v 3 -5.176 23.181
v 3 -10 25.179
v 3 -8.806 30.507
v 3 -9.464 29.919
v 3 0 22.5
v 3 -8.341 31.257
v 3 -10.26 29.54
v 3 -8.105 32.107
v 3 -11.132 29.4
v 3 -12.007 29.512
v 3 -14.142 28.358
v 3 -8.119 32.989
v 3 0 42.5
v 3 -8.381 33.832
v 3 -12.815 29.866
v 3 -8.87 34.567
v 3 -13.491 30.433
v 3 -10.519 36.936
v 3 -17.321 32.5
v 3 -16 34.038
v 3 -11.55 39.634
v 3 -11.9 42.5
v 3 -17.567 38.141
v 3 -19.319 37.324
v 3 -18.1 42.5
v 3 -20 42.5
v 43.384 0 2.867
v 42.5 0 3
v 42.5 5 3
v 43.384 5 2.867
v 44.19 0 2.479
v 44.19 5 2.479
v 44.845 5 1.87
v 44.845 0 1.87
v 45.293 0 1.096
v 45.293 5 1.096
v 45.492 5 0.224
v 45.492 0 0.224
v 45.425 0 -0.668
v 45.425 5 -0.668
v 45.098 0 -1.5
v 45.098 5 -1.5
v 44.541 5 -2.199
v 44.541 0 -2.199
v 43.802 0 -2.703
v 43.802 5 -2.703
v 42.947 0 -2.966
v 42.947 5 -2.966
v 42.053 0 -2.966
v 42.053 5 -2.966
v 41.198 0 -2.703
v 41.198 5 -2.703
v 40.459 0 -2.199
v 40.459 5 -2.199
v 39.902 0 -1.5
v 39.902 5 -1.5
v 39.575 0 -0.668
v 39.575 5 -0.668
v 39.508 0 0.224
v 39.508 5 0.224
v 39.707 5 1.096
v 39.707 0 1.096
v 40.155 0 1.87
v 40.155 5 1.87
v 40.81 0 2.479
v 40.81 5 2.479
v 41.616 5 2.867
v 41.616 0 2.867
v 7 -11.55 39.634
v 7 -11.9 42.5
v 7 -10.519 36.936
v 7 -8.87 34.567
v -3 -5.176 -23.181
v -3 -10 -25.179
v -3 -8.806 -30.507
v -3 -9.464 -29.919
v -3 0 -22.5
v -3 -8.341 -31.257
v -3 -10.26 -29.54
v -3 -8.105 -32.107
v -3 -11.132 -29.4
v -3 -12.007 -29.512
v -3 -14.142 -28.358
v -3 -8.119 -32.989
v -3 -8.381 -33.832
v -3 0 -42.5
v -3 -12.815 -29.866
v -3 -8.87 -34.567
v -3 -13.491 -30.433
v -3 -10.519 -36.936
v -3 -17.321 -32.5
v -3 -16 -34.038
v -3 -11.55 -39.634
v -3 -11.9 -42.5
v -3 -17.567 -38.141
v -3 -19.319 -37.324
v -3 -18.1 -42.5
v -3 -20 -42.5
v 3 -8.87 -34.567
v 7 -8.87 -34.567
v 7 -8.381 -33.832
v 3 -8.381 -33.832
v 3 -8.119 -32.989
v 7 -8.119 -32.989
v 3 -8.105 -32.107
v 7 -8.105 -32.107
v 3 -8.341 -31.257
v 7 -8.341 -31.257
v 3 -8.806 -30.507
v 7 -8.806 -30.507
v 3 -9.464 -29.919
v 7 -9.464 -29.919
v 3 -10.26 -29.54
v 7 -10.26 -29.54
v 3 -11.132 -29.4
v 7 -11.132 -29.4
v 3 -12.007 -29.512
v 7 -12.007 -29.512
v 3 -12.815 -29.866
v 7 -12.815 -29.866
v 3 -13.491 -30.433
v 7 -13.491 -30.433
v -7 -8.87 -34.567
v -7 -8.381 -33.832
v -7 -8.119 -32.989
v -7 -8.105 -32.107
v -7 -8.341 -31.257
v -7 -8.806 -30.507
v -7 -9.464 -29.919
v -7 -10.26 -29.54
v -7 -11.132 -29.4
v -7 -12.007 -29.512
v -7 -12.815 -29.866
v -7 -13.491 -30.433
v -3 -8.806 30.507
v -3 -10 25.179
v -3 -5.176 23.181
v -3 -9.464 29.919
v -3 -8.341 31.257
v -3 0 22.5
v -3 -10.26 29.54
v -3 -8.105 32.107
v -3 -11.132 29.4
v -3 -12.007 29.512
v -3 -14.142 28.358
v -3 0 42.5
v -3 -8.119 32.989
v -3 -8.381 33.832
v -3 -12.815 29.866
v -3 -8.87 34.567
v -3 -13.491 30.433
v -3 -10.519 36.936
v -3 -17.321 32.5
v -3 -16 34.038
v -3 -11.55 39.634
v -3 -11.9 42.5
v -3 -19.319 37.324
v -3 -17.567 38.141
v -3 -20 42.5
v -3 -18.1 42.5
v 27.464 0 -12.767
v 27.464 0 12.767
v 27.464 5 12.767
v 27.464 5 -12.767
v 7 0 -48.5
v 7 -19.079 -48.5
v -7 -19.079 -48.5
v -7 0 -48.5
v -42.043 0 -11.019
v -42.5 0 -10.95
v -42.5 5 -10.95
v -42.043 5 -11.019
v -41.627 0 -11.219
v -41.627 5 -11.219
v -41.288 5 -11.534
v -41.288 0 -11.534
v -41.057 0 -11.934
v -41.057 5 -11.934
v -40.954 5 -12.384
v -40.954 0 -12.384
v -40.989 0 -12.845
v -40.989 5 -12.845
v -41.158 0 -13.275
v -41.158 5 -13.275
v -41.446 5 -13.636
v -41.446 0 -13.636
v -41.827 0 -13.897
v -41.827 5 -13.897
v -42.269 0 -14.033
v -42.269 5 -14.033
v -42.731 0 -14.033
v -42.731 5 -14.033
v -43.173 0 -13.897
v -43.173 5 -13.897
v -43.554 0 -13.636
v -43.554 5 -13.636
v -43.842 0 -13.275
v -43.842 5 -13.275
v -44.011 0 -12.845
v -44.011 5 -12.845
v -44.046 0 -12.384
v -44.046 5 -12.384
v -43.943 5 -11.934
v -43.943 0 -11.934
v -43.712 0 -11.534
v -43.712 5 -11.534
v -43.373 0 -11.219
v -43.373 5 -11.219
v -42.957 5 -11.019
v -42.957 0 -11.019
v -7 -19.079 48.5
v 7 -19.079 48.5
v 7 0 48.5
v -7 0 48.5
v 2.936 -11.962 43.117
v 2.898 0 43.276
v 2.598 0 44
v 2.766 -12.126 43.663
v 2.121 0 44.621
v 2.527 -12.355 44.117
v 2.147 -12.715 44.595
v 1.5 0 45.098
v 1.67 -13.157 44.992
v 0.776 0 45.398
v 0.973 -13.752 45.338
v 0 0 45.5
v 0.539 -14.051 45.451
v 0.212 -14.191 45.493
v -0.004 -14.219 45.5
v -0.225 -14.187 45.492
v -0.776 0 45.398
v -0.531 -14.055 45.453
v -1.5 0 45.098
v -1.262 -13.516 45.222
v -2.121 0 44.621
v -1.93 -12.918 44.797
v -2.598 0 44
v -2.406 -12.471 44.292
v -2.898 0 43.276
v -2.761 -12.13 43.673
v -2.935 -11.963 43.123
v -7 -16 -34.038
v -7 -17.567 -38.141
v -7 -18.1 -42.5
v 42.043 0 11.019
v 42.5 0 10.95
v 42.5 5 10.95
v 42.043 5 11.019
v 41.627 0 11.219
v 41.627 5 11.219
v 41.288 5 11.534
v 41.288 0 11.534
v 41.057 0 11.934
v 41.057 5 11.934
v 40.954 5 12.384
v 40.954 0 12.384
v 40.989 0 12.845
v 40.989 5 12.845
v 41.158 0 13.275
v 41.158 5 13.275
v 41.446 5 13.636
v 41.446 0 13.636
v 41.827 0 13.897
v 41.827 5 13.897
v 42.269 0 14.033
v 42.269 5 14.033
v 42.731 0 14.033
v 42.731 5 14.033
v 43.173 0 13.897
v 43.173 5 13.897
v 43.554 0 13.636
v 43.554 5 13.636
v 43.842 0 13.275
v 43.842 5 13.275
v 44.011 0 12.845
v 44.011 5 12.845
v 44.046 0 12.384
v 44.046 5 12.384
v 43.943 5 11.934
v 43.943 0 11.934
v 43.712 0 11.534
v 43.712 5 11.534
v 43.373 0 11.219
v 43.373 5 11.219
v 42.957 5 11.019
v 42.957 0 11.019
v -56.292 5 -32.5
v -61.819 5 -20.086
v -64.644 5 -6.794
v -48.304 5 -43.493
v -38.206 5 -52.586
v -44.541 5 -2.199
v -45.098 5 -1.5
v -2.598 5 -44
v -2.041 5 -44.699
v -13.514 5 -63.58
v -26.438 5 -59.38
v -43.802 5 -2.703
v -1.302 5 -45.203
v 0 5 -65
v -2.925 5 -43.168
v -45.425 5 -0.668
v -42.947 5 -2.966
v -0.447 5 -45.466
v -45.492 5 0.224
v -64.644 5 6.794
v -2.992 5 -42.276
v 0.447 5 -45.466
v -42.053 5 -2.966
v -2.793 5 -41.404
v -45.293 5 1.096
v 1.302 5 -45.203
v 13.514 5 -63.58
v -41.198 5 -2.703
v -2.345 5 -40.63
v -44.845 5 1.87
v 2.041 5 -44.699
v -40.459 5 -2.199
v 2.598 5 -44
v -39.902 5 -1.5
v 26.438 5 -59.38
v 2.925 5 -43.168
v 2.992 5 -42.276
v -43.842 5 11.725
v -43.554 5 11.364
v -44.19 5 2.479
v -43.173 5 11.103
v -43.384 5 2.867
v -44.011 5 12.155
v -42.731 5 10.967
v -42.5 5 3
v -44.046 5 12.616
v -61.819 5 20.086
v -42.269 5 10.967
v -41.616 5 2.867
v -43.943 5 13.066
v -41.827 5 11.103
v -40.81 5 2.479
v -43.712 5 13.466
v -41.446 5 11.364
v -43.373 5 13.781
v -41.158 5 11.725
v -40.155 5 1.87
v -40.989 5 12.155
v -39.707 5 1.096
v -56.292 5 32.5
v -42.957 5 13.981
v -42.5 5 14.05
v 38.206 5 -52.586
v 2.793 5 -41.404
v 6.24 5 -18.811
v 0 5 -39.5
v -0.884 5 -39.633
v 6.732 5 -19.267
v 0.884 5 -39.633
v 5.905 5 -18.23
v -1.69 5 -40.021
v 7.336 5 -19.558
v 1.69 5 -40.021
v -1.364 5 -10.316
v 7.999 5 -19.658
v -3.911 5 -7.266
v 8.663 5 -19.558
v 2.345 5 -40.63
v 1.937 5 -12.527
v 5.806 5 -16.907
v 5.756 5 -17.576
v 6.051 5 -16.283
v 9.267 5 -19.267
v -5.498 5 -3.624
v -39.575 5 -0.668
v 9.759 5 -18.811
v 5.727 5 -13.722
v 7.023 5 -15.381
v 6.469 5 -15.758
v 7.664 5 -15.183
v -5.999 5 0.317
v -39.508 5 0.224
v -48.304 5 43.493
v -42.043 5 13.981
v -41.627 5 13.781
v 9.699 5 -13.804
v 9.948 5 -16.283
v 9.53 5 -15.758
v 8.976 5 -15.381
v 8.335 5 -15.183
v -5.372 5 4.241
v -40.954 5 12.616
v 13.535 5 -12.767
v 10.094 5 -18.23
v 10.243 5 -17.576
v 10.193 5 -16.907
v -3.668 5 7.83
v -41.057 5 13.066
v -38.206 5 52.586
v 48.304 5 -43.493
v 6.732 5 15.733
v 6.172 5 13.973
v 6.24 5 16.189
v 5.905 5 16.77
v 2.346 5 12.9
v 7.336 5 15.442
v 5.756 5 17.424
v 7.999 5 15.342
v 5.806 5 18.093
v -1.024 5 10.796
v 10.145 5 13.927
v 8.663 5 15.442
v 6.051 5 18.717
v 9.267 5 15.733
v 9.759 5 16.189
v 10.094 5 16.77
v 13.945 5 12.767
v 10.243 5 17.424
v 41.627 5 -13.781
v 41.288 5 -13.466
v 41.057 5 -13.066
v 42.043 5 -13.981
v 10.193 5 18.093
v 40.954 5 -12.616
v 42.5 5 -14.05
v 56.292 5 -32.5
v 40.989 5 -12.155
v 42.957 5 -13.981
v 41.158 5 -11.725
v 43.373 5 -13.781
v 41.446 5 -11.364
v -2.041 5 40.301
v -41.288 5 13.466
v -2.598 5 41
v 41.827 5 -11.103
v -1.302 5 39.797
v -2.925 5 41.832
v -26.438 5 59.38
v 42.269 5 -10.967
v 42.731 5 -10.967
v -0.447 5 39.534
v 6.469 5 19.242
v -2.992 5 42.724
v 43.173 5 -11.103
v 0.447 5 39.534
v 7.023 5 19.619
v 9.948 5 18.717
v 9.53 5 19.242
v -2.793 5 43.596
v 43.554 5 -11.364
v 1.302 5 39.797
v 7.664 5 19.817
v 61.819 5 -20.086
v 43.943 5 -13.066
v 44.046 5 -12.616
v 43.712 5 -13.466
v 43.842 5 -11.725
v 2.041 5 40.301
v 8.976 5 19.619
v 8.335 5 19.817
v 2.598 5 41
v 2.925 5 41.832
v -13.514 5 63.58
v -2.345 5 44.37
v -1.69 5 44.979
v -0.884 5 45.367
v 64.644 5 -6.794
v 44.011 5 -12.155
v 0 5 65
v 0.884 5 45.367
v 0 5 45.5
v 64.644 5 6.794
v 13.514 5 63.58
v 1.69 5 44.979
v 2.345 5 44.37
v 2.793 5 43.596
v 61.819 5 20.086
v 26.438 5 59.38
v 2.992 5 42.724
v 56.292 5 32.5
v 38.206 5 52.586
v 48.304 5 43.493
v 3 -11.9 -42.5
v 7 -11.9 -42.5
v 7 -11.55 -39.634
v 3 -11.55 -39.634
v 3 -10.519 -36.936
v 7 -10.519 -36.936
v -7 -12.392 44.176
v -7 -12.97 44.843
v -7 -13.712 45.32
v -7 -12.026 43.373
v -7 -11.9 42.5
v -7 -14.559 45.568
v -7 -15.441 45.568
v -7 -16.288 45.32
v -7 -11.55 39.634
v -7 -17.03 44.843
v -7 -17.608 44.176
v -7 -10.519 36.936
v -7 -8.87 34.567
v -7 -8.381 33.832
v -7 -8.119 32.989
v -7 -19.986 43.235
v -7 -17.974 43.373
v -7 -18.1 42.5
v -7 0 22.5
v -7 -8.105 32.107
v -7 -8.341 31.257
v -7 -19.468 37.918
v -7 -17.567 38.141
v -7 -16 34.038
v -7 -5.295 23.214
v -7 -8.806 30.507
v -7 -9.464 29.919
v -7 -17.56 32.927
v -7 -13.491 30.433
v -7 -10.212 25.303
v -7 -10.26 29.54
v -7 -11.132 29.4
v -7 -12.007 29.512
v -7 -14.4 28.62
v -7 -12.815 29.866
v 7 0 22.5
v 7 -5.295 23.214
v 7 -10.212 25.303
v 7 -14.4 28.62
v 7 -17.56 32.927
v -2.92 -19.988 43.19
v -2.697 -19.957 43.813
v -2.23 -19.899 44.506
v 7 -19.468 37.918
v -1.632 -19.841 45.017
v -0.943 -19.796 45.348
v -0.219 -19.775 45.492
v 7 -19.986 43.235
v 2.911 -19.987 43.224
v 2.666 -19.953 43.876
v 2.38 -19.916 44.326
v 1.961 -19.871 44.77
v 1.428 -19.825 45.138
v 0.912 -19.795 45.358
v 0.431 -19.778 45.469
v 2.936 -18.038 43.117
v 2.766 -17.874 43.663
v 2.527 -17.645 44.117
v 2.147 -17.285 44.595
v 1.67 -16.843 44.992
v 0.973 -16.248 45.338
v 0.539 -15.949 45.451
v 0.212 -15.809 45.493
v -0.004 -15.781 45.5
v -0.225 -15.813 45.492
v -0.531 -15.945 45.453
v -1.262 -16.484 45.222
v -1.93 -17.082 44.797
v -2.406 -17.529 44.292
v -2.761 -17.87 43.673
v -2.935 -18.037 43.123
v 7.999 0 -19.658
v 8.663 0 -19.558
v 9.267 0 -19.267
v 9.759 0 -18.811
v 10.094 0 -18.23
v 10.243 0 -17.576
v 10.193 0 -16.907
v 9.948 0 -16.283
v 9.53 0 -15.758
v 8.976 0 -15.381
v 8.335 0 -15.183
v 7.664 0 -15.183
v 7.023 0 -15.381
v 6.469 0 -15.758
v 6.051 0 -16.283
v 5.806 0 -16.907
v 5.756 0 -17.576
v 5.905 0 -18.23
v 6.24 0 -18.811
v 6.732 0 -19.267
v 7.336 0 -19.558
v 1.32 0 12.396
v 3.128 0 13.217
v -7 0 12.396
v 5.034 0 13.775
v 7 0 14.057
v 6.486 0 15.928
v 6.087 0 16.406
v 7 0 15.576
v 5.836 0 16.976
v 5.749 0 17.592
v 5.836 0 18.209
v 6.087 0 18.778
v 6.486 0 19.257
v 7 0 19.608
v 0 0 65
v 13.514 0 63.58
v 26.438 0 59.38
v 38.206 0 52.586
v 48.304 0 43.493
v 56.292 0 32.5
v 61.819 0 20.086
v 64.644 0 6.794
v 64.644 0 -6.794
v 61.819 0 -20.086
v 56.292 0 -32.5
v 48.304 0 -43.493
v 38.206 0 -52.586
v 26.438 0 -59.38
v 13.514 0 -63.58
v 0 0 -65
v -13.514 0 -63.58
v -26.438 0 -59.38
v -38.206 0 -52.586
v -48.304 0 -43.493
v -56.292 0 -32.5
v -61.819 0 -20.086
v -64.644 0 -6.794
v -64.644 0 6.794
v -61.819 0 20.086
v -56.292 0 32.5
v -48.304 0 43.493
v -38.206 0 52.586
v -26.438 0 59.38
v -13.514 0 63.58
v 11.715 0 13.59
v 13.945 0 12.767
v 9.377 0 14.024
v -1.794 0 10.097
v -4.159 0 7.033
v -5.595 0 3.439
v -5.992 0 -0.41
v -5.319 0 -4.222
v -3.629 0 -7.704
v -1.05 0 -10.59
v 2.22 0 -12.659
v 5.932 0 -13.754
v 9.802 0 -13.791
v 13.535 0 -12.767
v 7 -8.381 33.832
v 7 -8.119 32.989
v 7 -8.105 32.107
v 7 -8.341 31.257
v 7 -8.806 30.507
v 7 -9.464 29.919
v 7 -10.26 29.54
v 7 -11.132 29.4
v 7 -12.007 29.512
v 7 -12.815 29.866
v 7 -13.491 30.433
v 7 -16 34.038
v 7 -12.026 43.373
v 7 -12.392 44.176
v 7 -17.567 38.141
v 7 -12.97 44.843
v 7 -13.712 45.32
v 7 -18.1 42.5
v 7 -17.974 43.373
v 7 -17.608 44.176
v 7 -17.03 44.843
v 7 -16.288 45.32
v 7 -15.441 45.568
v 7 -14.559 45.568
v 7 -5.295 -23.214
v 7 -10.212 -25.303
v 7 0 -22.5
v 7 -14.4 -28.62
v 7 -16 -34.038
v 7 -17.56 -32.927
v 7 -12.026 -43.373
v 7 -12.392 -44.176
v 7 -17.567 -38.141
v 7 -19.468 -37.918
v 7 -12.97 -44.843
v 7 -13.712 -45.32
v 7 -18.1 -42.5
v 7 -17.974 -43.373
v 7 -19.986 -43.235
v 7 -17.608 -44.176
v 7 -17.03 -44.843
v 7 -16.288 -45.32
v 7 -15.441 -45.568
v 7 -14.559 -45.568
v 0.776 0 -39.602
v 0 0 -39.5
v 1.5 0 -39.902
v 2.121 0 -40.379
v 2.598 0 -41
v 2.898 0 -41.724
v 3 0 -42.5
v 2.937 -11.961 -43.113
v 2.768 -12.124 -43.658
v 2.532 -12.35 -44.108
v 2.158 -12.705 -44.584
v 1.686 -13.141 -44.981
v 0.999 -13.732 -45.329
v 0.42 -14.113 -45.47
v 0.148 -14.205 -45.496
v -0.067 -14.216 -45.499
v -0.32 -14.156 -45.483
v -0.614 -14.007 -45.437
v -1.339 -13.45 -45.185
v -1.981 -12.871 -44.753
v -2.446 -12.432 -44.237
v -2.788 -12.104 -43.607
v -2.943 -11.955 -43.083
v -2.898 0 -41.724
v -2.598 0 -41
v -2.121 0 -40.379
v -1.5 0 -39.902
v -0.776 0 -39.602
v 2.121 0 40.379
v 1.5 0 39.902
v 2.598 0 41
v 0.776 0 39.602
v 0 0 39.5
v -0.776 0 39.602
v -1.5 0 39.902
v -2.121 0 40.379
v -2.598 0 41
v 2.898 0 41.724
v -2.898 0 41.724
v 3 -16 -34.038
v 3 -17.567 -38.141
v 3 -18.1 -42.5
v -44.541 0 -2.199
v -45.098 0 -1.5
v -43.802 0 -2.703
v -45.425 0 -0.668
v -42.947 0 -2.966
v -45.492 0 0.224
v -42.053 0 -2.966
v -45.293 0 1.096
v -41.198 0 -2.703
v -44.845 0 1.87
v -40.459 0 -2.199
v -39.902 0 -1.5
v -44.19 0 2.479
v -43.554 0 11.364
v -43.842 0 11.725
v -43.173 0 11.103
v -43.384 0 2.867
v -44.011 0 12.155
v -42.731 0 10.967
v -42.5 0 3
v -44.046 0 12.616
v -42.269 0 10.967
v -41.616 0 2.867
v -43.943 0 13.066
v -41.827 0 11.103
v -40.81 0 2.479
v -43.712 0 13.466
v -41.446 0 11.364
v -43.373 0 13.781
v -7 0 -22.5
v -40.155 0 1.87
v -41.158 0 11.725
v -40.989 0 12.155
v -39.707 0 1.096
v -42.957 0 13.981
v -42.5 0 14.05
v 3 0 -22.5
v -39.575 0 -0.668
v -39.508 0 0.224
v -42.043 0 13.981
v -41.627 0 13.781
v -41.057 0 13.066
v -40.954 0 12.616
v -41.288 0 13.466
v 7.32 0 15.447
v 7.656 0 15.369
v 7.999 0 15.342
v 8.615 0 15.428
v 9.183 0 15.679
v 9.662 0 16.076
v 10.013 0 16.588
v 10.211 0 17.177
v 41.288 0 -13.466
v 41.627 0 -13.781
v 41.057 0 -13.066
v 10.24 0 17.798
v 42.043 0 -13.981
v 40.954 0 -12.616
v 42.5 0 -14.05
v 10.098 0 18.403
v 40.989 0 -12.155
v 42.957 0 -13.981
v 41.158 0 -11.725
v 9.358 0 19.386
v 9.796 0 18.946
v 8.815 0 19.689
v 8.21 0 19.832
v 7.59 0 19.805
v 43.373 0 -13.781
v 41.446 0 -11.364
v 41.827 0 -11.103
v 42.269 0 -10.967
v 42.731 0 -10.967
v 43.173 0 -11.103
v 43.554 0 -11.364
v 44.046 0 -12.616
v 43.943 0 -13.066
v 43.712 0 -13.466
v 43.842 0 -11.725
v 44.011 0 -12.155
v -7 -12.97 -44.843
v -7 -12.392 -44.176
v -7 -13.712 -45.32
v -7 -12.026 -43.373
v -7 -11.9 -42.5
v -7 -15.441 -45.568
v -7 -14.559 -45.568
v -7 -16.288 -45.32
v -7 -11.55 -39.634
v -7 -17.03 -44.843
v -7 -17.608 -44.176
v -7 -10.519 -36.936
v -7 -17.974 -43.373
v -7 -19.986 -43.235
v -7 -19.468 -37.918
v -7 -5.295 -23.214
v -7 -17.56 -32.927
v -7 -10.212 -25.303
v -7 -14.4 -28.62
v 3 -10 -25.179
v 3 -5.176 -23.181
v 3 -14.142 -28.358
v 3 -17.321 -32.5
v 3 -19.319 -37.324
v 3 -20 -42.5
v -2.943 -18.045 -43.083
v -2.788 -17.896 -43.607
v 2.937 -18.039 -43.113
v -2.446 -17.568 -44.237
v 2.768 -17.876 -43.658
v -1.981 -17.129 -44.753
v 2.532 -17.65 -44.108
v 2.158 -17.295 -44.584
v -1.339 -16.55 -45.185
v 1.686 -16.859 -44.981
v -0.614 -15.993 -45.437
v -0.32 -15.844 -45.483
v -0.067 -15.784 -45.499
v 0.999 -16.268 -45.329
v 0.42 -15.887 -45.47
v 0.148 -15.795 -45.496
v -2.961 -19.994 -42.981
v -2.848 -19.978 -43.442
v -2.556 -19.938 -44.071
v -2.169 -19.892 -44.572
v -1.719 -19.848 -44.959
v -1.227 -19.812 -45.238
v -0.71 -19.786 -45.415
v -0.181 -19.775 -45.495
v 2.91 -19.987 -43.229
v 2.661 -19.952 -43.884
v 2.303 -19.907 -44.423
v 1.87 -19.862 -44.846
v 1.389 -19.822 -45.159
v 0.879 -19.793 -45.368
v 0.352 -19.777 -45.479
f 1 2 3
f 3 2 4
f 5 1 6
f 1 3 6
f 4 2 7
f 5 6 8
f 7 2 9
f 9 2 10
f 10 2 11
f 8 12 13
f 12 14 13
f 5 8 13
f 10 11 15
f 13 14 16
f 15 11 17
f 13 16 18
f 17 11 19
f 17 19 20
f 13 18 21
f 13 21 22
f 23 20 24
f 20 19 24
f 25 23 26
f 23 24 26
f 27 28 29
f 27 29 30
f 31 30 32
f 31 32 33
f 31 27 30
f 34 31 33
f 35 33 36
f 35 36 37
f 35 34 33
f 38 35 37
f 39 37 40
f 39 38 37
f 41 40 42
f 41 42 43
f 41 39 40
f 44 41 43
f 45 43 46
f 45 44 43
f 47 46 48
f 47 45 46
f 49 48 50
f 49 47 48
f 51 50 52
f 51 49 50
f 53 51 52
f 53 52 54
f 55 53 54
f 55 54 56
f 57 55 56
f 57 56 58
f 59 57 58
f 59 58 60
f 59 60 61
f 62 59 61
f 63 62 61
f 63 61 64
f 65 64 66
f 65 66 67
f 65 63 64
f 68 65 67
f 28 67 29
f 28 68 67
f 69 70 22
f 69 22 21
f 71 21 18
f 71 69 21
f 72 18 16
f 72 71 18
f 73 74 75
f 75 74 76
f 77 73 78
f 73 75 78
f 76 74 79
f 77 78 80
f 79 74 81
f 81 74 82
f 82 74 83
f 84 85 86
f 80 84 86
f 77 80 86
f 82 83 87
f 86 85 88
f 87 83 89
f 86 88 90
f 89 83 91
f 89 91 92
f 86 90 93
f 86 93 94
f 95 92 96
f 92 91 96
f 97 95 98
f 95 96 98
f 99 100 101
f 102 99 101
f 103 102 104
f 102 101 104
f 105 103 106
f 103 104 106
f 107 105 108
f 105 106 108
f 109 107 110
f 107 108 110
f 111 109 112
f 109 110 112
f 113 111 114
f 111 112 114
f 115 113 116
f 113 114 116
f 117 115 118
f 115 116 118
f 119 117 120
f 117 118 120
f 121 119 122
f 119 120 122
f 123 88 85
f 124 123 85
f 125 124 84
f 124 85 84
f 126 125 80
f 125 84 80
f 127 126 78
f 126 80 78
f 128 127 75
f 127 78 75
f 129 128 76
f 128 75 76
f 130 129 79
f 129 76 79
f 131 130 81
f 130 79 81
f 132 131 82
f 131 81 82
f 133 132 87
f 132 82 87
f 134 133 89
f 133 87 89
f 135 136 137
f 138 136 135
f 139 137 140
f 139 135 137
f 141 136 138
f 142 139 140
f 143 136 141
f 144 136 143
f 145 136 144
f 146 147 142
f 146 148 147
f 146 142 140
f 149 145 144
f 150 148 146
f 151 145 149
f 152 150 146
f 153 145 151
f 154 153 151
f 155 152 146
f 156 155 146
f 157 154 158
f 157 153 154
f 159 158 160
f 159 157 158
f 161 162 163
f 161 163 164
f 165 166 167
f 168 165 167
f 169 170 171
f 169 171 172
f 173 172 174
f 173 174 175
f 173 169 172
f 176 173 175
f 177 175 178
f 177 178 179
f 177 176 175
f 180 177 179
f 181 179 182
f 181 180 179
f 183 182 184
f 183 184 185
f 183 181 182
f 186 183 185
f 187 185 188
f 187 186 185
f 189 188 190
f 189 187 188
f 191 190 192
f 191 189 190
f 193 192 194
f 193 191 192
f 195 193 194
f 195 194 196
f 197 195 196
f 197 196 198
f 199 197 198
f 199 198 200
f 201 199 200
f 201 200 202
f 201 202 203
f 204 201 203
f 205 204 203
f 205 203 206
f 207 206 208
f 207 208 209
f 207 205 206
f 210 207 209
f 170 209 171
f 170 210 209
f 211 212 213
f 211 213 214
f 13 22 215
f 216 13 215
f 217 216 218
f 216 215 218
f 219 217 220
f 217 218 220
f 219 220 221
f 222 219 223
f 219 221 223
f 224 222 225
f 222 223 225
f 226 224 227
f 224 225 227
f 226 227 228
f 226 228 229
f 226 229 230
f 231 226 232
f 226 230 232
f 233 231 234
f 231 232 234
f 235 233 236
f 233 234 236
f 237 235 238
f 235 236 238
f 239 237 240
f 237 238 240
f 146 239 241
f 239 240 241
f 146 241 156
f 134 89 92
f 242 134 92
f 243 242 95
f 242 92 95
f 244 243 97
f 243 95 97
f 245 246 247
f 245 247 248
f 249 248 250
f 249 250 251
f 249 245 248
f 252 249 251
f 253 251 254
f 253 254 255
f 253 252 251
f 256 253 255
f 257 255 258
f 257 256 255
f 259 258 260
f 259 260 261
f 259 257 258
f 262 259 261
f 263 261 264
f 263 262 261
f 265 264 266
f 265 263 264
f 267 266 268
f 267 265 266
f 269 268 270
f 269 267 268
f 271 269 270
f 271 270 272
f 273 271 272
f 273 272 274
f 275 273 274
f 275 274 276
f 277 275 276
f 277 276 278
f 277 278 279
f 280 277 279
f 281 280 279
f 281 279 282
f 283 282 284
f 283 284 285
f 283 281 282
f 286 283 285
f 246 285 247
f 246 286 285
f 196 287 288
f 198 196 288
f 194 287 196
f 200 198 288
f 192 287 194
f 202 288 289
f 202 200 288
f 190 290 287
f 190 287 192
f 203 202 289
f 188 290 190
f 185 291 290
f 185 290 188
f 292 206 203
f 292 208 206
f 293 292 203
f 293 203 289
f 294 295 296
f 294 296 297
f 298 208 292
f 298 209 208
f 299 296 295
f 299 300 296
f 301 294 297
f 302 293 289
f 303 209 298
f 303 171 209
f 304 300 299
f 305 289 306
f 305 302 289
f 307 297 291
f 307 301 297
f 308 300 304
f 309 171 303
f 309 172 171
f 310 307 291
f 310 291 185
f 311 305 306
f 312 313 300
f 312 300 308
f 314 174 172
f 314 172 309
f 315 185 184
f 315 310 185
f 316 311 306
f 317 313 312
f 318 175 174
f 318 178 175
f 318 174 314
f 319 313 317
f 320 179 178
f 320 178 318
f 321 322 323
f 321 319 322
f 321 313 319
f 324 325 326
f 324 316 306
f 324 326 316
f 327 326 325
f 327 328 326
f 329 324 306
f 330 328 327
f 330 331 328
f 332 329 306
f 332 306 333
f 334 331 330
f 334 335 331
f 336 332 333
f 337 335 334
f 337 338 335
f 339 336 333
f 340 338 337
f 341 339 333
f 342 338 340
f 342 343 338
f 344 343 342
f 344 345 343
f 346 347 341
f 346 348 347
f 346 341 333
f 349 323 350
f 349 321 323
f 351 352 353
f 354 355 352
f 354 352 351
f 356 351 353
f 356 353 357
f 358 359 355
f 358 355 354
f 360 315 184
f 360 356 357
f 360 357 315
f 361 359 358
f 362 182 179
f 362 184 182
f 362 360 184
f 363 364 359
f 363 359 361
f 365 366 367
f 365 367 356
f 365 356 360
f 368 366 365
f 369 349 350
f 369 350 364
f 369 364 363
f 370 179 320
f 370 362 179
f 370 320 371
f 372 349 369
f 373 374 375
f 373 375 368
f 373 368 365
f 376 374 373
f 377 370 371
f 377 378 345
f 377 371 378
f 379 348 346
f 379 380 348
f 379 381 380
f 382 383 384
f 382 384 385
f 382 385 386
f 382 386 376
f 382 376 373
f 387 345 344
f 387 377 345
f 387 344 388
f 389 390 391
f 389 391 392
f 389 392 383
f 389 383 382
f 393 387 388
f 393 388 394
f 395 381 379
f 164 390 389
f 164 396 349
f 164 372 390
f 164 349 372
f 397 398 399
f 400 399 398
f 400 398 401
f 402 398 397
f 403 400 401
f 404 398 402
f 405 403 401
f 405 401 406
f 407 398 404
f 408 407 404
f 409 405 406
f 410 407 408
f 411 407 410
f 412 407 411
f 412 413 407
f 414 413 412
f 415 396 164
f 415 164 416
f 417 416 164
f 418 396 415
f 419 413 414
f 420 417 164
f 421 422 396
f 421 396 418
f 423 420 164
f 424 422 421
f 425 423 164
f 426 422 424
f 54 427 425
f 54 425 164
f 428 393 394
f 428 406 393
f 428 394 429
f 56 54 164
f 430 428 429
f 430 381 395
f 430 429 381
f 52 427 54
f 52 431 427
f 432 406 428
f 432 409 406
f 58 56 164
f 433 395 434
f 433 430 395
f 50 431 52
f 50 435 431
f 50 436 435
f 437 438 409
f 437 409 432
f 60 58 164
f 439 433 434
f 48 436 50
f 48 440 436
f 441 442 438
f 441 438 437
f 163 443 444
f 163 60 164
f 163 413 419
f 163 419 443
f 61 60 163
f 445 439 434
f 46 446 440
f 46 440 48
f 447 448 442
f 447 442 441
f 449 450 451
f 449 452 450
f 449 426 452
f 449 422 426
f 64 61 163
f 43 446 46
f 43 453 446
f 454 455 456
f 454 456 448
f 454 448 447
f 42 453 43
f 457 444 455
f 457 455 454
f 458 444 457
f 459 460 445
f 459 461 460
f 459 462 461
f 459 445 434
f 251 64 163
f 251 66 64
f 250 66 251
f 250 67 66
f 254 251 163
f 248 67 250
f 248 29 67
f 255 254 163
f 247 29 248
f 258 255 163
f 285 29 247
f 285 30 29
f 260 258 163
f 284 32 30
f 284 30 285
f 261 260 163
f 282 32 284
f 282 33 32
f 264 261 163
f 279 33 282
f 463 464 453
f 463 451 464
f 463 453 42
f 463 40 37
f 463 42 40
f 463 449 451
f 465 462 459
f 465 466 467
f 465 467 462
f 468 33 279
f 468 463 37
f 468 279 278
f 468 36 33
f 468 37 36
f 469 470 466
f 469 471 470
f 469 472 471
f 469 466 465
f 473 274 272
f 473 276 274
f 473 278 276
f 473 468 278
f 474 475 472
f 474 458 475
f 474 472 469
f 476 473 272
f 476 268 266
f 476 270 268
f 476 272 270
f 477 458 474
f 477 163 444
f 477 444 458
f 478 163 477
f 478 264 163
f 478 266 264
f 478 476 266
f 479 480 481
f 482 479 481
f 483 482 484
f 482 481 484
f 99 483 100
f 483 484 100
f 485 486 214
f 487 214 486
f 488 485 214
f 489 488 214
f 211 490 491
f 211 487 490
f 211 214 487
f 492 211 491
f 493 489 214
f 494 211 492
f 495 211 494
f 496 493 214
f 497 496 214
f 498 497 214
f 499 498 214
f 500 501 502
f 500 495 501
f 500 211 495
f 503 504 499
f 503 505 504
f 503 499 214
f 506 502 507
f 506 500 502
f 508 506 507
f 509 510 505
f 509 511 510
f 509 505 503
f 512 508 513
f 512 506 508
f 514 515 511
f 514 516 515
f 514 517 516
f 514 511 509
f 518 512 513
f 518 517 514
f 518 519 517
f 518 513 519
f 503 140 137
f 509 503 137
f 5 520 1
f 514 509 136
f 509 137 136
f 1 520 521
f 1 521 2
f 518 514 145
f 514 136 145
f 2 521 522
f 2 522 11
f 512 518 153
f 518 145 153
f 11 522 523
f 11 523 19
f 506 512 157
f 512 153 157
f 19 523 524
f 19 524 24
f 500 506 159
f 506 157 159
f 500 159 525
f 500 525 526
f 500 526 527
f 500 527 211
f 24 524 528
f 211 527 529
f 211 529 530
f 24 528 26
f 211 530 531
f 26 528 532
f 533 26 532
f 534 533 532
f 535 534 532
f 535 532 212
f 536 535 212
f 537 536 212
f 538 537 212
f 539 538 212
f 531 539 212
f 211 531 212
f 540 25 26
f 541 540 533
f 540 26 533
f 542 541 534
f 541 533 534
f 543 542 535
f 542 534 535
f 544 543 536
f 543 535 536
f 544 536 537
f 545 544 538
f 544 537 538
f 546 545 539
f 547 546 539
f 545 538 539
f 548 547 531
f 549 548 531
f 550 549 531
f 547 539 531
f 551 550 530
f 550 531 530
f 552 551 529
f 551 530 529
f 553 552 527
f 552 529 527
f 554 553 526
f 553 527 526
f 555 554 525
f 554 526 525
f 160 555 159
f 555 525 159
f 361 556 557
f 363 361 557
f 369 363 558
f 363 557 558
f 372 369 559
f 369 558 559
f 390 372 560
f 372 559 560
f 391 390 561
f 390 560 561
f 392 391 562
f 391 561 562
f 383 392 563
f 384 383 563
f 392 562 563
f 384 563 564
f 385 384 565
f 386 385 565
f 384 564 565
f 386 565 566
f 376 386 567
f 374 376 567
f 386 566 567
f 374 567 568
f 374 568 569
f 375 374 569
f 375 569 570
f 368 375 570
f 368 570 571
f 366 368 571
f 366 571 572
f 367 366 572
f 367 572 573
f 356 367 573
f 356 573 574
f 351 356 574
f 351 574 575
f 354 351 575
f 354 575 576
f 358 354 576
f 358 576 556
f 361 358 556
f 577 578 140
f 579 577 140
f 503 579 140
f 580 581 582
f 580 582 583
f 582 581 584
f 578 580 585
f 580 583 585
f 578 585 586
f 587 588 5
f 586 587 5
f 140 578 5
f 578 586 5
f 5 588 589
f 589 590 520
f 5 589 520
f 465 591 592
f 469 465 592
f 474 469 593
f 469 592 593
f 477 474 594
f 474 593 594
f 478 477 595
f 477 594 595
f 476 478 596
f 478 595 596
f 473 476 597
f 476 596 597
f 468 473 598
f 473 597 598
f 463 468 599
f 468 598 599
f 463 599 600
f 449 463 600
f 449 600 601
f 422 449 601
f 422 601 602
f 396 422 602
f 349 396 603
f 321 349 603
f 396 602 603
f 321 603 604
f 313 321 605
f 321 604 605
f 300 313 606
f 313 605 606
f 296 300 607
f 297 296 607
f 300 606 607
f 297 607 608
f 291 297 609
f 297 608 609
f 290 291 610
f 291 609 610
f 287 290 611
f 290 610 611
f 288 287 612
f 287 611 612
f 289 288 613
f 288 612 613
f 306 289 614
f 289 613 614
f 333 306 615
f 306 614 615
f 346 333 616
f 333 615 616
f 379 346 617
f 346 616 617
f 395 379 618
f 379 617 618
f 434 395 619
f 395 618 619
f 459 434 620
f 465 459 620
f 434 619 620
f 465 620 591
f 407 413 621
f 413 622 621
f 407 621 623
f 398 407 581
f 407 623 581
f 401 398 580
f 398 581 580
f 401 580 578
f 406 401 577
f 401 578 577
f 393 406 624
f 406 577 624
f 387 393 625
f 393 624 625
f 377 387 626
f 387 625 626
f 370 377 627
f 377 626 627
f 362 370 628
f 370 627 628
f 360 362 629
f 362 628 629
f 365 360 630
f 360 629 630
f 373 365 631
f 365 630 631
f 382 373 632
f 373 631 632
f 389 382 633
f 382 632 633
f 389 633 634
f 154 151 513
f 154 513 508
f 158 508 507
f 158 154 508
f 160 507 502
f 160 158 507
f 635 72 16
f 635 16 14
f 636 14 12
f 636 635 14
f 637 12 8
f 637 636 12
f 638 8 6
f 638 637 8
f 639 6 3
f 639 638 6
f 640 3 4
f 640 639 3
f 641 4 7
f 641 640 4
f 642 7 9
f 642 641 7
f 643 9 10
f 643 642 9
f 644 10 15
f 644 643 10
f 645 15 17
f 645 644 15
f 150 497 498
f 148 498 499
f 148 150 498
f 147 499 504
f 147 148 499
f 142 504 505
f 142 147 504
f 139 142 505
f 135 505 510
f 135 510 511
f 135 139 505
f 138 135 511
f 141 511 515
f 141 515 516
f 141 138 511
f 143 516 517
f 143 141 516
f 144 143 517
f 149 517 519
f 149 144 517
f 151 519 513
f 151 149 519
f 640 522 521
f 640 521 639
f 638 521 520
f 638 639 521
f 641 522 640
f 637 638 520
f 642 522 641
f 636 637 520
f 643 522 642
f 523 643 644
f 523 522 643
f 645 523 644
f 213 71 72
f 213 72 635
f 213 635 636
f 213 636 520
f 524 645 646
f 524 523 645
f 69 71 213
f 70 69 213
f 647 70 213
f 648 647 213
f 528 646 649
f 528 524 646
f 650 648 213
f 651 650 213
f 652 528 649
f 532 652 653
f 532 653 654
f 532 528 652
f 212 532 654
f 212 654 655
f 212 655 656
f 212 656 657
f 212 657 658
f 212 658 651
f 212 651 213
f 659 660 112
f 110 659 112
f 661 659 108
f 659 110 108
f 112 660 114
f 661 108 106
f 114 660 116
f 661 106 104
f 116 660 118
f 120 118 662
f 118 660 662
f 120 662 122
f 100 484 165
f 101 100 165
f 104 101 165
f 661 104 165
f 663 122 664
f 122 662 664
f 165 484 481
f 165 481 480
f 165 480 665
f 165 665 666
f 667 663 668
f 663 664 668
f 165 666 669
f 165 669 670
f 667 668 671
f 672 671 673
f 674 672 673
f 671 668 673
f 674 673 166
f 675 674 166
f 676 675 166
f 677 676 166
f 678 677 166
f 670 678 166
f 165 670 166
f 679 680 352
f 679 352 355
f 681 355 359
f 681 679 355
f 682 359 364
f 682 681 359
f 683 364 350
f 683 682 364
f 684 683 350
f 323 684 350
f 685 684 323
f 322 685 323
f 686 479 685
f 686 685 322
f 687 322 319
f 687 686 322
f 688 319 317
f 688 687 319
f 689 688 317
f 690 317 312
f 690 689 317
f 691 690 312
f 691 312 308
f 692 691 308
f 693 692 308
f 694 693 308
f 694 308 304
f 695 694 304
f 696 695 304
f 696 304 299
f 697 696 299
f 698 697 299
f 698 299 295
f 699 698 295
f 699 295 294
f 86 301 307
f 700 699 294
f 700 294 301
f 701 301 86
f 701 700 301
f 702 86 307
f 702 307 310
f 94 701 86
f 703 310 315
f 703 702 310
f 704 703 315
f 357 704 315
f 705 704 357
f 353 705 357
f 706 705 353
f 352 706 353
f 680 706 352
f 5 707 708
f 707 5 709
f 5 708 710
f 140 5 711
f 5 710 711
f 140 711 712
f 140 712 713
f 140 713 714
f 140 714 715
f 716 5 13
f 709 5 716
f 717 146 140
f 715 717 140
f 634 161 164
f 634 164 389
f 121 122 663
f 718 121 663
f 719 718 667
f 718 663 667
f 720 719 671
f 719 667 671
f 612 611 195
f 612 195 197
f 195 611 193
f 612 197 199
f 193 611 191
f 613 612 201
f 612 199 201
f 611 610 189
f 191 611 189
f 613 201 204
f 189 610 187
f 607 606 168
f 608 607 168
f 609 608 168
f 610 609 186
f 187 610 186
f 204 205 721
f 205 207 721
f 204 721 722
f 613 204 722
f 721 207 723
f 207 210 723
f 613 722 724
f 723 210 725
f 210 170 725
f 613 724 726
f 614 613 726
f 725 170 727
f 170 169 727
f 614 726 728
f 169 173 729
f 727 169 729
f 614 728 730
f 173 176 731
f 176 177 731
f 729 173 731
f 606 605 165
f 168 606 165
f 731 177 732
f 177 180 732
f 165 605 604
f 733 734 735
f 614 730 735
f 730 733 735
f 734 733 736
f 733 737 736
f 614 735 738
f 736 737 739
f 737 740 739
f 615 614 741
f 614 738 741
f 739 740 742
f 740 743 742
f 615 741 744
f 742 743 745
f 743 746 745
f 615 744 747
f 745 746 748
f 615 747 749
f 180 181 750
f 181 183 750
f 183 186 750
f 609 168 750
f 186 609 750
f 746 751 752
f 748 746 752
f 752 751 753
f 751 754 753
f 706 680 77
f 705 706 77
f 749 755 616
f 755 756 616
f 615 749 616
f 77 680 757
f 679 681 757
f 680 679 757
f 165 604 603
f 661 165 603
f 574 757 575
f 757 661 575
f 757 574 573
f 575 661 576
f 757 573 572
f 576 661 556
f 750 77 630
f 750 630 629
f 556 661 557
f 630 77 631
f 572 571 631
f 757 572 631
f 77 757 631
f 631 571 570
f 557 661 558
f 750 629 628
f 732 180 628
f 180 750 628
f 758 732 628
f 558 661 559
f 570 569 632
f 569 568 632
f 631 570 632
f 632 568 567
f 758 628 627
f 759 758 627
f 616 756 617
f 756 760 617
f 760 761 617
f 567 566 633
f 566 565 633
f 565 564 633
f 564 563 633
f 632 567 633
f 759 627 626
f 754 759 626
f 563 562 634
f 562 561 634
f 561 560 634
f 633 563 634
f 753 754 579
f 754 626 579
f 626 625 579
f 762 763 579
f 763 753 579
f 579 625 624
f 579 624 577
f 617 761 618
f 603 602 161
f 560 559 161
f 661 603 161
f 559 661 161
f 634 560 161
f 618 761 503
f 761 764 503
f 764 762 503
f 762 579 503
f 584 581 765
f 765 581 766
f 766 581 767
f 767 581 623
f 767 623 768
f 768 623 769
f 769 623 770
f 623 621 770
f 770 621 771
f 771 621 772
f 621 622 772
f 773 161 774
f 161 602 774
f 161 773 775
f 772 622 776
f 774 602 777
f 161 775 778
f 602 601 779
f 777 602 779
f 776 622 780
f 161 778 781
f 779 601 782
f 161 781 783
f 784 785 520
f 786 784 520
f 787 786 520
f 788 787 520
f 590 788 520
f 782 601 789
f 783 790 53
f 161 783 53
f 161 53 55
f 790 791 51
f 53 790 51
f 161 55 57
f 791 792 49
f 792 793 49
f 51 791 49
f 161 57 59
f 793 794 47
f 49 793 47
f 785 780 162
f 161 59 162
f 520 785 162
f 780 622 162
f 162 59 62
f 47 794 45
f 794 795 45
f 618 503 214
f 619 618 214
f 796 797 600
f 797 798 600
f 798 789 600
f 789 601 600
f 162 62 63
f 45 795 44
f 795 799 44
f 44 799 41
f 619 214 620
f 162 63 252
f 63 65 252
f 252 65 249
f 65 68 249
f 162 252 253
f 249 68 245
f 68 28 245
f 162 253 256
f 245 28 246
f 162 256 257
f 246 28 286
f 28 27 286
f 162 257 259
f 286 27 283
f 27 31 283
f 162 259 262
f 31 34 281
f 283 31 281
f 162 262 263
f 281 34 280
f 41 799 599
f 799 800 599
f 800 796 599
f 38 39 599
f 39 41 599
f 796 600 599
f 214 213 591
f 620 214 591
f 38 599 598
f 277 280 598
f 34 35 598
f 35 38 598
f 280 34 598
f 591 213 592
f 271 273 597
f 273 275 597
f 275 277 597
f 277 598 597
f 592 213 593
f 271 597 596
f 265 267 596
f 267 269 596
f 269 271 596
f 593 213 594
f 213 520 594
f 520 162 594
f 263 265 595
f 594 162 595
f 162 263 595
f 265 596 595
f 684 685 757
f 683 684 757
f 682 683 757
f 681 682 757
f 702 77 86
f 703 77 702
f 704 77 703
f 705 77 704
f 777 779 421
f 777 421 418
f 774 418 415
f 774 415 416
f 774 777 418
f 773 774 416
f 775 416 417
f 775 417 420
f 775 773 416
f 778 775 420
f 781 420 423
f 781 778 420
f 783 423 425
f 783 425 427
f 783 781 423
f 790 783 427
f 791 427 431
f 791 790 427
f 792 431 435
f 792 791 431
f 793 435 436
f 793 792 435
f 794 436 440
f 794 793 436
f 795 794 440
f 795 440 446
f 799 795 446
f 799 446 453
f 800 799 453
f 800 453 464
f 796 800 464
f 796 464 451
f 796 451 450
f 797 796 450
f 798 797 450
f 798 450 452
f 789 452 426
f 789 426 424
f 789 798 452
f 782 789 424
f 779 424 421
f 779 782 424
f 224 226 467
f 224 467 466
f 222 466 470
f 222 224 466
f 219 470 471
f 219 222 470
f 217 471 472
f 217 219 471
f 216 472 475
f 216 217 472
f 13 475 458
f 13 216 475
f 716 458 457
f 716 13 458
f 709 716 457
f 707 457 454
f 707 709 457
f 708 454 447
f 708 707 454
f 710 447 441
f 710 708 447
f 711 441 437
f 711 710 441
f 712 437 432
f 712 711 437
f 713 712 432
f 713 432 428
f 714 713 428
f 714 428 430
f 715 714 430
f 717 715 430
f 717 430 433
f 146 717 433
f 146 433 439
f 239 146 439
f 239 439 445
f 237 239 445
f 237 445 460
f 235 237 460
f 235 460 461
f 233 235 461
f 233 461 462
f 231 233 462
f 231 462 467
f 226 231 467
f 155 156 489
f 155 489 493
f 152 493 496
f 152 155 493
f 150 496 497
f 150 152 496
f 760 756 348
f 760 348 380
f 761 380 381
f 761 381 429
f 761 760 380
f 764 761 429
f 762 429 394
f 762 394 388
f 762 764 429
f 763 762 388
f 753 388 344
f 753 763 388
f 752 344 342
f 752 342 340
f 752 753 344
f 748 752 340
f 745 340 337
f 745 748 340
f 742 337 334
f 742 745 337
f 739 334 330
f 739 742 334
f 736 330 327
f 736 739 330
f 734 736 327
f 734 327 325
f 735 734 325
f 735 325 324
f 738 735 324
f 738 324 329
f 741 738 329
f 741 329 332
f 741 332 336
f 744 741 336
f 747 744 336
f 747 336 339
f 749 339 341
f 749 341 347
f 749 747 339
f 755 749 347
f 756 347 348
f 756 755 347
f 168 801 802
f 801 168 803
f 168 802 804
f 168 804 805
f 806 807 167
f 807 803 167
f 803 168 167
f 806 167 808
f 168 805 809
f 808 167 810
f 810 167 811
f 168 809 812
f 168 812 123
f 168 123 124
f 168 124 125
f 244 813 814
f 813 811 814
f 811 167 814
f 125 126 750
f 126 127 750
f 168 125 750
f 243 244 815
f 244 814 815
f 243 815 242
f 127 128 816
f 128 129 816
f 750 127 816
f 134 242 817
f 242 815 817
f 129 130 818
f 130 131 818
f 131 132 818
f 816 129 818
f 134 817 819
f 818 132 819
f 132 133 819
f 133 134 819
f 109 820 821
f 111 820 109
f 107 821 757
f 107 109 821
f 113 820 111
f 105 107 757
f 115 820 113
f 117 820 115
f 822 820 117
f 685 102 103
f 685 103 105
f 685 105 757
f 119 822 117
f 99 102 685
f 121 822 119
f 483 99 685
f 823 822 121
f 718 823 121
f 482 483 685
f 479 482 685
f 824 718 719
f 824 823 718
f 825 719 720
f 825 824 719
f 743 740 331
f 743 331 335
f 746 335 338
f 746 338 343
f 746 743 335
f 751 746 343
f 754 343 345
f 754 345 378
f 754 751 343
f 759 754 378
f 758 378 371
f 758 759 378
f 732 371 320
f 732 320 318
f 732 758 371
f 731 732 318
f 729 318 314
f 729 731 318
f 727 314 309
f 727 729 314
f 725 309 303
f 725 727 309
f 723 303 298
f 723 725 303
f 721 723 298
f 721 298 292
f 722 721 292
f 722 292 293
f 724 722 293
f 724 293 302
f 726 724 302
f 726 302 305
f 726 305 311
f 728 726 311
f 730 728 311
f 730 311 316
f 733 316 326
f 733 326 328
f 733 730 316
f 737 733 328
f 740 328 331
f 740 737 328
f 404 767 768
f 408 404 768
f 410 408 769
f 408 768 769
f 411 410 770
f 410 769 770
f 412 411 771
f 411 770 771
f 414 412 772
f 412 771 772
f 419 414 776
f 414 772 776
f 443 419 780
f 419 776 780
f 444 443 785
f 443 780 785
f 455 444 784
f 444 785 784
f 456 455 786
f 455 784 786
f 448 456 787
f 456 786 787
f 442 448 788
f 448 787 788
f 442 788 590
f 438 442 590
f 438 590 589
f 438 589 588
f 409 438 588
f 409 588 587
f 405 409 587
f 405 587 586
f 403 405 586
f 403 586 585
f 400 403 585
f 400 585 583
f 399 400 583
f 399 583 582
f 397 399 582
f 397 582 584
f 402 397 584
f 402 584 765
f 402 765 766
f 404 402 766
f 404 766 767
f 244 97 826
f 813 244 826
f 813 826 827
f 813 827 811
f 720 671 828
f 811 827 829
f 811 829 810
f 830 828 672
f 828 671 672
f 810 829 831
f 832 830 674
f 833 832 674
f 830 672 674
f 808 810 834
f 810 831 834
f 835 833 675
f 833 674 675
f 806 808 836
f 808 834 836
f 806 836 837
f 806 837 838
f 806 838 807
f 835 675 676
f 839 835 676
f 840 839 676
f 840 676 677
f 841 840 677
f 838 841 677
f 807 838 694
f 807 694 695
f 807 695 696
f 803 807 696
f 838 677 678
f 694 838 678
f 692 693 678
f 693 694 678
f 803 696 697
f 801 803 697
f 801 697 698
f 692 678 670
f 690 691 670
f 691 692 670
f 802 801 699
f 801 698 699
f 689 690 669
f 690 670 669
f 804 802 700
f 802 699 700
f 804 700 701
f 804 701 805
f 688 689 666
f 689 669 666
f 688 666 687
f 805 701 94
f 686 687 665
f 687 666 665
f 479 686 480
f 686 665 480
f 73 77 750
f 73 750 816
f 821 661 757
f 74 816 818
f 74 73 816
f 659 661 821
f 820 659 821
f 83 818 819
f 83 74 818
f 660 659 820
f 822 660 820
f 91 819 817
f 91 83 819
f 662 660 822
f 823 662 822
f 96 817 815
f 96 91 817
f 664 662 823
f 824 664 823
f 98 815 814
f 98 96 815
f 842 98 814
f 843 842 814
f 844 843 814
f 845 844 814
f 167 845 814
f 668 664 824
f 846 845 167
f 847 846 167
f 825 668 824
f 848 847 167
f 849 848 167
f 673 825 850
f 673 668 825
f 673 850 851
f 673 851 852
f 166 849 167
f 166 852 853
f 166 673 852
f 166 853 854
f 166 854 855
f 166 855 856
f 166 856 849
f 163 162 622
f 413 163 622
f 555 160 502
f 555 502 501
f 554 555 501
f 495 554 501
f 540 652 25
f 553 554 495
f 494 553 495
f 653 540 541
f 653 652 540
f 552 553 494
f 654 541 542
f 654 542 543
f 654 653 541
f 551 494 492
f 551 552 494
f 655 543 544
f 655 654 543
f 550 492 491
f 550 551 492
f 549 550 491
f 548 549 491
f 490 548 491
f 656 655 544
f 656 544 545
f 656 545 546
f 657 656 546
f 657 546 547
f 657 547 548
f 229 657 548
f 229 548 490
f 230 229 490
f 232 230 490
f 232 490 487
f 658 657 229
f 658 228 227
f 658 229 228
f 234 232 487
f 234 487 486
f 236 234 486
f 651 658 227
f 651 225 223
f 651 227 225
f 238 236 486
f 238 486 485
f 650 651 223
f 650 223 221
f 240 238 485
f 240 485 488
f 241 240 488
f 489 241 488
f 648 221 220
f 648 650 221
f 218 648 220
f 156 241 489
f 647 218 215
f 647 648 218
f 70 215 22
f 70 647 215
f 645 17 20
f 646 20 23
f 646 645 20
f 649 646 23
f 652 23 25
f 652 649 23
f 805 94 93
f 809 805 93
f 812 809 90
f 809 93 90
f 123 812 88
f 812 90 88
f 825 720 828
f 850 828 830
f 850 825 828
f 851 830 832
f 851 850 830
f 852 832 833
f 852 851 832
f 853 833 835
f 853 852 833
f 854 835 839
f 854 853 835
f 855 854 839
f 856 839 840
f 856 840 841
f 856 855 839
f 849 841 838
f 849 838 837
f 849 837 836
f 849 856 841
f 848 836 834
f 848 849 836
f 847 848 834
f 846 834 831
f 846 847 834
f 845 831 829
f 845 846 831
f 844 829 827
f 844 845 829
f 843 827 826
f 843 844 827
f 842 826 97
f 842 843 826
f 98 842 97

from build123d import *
from build123d.topology import SkipClean

# Parameters (mm, degrees)
SKETCH1_R           = 65
SKETCH1_R_2         = 5
SKETCH1_R_3         = 3
SKETCH1_R_4         = 1.55
BOSS_EXTRUDE1_DEPTH = 5
SKETCH2_R           = 14
CUT_EXTRUDE2_DEPTH  = 10
SKETCH3_R           = 2.25
SKETCH3_W           = 17.301764966
SKETCH3_H           = 25.534036418
CUT_EXTRUDE3_DEPTH  = 10
BOSS_EXTRUDE2_START = -27.5
SKETCH4_R           = 3
BOSS_EXTRUDE2_DEPTH = 22.5
SKETCH6_W           = 6
SKETCH6_H           = 20
CUT_EXTRUDE4_DEPTH  = 22.5
CUT_EXTRUDE5_REACH  = 101.575


with BuildPart() as part:
    # Sketch1 → Boss-Extrude1 (new body)
    with BuildSketch(Plane(origin=(0, 0, 0), x_dir=(1, 0, 0), z_dir=(0, 1, 0))):
        with Locations(Location((0, 0, 0), (0, 0, 270))):
            Circle(SKETCH1_R)
        with Locations(Location((0, 0, 0), (0, 0, 270))):
            Circle(SKETCH1_R_2, mode=Mode.SUBTRACT)
        with Locations(Location((0, 42.5, 0), (0, 0, 270))):
            Circle(SKETCH1_R_3, mode=Mode.SUBTRACT)
        with Locations(Location((42.5, 0, 0), (0, 0, 270))):
            Circle(SKETCH1_R_3, mode=Mode.SUBTRACT)
        with Locations(Location((0, -42.5, 0), (0, 0, 270))):
            Circle(SKETCH1_R_3, mode=Mode.SUBTRACT)
        with Locations(Location((-42.5, 0, 0), (0, 0, 270))):
            Circle(SKETCH1_R_3, mode=Mode.SUBTRACT)
        with Locations(Location((-42.5, -12.5, 0), (0, 0, 270))):
            Circle(SKETCH1_R_4, mode=Mode.SUBTRACT)
        with Locations(Location((-42.5, 12.5, 0), (0, 0, 270))):
            Circle(SKETCH1_R_4, mode=Mode.SUBTRACT)
        with Locations(Location((42.5, -12.5, 0), (0, 0, 90))):
            Circle(SKETCH1_R_4, mode=Mode.SUBTRACT)
        with Locations(Location((42.5, 12.5, 0), (0, 0, 90))):
            Circle(SKETCH1_R_4, mode=Mode.SUBTRACT)
    extrude(amount=BOSS_EXTRUDE1_DEPTH)

    # Sketch2 → Cut-Extrude2 (cut)
    with BuildSketch(Plane(origin=(0, 0, 0), x_dir=(-1, 0, 0), z_dir=(0, -1, 0))):
        with Locations(Location((-7.999467705, -0.092284522, 0), (0, 0, 90))):
            Circle(SKETCH2_R)
    extrude(amount=-CUT_EXTRUDE2_DEPTH, mode=Mode.SUBTRACT)

    # Sketch3 → Cut-Extrude3 (cut)
    with BuildSketch(Plane(origin=(0, 0, 0), x_dir=(-1, 0, 0), z_dir=(0, -1, 0))):
        with Locations(Location((-7.999467705, -17.592284522, 0), (0, 0, 90))):
            Circle(SKETCH3_R)
        with Locations(Location((-7.999467705, 17.407715478, 0), (0, 0, 90))):
            Circle(SKETCH3_R)
        with Locations((-18.812677283, 0)):
            Rectangle(SKETCH3_W, SKETCH3_H)
    extrude(amount=-CUT_EXTRUDE3_DEPTH, mode=Mode.SUBTRACT)

    # Sketch4 → Boss-Extrude2 (add)
    with BuildSketch(Plane(origin=(0, 5, 0), x_dir=(1, 0, 0), z_dir=(0, 1, 0)).offset(BOSS_EXTRUDE2_START)):
        Polygon((-7, 42.5), (-7, 22.5), (7, 22.5), (7, 42.5), (7, 48.5), (-7, 48.5), align=None)
        with Locations(Location((0, 42.5, 0), (0, 0, 270))):
            Circle(SKETCH4_R, mode=Mode.SUBTRACT)
    boss_extrude2 = extrude(amount=BOSS_EXTRUDE2_DEPTH)

    # Sketch6 → Cut-Extrude4 (cut)
    with BuildSketch(Plane(origin=(0, -22.5, 0), x_dir=(-1, 0, 0), z_dir=(0, -1, 0))):
        with Locations((0, 32.5)):
            Rectangle(SKETCH6_W, SKETCH6_H)
    cut_extrude4 = extrude(amount=-CUT_EXTRUDE4_DEPTH, mode=Mode.SUBTRACT)

    # Cut-Extrude5: up to this face of the body (flat: up to its plane)
    cut_extrude5_end = Plane(part.part.faces().sort_by_distance((-7, -11.25, -35.5))[0])
    # Sketch7 → Cut-Extrude5 (cut, up to the picked face)
    with BuildSketch(Plane(origin=(7, 0, 0), x_dir=(0, 0, -1), z_dir=(1, 0, 0)), mode=Mode.PRIVATE) as cut_extrude5_sk1:
        with BuildLine():
            Line((12.396013553, 0), (22.5, 0))
            ThreePointArc((22.5, 0), (30.667840434, -16.124515497), (48.5, -19.078784028))
            Line((48.5, -19.078784028), (48.5, -29.5))
            ThreePointArc((48.5, -29.5), (23.452348159, -23.31173437), (12.396013553, 0))
        make_face()
    cut_extrude5_tool1 = split(extrude(cut_extrude5_sk1.sketch, amount=-CUT_EXTRUDE5_REACH, mode=Mode.PRIVATE), bisect_by=cut_extrude5_end, keep=Keep.BOTH, mode=Mode.PRIVATE)
    # Sketch7 → Cut-Extrude5 (cut, up to the picked face)
    with BuildSketch(Plane(origin=(7, 0, 0), x_dir=(0, 0, -1), z_dir=(1, 0, 0)), mode=Mode.PRIVATE) as cut_extrude5_sk2:
        with BuildLine():
            ThreePointArc((42.5, -18.1), (45.6, -15), (42.5, -11.9))
            ThreePointArc((42.5, -11.9), (38.253817132, -11.116651072), (34.566666667, -8.869736311))
            ThreePointArc((34.566666667, -8.869736311), (30.189396423, -9.113673221), (30.433333333, -13.490943464))
            ThreePointArc((30.433333333, -13.490943464), (36.041520175, -16.908519697), (42.5, -18.1))
        make_face()
    cut_extrude5_tool2 = split(extrude(cut_extrude5_sk2.sketch, amount=-CUT_EXTRUDE5_REACH, mode=Mode.PRIVATE), bisect_by=cut_extrude5_end, keep=Keep.BOTH, mode=Mode.PRIVATE)
    cut_extrude5_1 = cut_extrude5_tool1.solids().sort_by(Axis((7, -17.317055, -28.895304), (-1, 0, 0)))[0]
    add(cut_extrude5_1, mode=Mode.SUBTRACT)
    cut_extrude5_2 = cut_extrude5_tool2.solids().sort_by(Axis((7, -13.514827, -37.337795), (-1, 0, 0)))[0]
    add(cut_extrude5_2, mode=Mode.SUBTRACT)
    cut_extrude5 = cut_extrude5_1 + cut_extrude5_2  # Cut-Extrude5 as one shape, for the pattern or mirror that repeats it

    # Mirror1: Boss-Extrude2, Cut-Extrude4, Cut-Extrude5 across plane
    with SkipClean():  # the faces are left unmerged after this step: merging them gives an invalid solid
        add(boss_extrude2.mirror(Plane.XY))
        add(cut_extrude4.mirror(Plane.XY), mode=Mode.SUBTRACT)
        add(cut_extrude5.mirror(Plane.XY), mode=Mode.SUBTRACT)


solid = part.part
